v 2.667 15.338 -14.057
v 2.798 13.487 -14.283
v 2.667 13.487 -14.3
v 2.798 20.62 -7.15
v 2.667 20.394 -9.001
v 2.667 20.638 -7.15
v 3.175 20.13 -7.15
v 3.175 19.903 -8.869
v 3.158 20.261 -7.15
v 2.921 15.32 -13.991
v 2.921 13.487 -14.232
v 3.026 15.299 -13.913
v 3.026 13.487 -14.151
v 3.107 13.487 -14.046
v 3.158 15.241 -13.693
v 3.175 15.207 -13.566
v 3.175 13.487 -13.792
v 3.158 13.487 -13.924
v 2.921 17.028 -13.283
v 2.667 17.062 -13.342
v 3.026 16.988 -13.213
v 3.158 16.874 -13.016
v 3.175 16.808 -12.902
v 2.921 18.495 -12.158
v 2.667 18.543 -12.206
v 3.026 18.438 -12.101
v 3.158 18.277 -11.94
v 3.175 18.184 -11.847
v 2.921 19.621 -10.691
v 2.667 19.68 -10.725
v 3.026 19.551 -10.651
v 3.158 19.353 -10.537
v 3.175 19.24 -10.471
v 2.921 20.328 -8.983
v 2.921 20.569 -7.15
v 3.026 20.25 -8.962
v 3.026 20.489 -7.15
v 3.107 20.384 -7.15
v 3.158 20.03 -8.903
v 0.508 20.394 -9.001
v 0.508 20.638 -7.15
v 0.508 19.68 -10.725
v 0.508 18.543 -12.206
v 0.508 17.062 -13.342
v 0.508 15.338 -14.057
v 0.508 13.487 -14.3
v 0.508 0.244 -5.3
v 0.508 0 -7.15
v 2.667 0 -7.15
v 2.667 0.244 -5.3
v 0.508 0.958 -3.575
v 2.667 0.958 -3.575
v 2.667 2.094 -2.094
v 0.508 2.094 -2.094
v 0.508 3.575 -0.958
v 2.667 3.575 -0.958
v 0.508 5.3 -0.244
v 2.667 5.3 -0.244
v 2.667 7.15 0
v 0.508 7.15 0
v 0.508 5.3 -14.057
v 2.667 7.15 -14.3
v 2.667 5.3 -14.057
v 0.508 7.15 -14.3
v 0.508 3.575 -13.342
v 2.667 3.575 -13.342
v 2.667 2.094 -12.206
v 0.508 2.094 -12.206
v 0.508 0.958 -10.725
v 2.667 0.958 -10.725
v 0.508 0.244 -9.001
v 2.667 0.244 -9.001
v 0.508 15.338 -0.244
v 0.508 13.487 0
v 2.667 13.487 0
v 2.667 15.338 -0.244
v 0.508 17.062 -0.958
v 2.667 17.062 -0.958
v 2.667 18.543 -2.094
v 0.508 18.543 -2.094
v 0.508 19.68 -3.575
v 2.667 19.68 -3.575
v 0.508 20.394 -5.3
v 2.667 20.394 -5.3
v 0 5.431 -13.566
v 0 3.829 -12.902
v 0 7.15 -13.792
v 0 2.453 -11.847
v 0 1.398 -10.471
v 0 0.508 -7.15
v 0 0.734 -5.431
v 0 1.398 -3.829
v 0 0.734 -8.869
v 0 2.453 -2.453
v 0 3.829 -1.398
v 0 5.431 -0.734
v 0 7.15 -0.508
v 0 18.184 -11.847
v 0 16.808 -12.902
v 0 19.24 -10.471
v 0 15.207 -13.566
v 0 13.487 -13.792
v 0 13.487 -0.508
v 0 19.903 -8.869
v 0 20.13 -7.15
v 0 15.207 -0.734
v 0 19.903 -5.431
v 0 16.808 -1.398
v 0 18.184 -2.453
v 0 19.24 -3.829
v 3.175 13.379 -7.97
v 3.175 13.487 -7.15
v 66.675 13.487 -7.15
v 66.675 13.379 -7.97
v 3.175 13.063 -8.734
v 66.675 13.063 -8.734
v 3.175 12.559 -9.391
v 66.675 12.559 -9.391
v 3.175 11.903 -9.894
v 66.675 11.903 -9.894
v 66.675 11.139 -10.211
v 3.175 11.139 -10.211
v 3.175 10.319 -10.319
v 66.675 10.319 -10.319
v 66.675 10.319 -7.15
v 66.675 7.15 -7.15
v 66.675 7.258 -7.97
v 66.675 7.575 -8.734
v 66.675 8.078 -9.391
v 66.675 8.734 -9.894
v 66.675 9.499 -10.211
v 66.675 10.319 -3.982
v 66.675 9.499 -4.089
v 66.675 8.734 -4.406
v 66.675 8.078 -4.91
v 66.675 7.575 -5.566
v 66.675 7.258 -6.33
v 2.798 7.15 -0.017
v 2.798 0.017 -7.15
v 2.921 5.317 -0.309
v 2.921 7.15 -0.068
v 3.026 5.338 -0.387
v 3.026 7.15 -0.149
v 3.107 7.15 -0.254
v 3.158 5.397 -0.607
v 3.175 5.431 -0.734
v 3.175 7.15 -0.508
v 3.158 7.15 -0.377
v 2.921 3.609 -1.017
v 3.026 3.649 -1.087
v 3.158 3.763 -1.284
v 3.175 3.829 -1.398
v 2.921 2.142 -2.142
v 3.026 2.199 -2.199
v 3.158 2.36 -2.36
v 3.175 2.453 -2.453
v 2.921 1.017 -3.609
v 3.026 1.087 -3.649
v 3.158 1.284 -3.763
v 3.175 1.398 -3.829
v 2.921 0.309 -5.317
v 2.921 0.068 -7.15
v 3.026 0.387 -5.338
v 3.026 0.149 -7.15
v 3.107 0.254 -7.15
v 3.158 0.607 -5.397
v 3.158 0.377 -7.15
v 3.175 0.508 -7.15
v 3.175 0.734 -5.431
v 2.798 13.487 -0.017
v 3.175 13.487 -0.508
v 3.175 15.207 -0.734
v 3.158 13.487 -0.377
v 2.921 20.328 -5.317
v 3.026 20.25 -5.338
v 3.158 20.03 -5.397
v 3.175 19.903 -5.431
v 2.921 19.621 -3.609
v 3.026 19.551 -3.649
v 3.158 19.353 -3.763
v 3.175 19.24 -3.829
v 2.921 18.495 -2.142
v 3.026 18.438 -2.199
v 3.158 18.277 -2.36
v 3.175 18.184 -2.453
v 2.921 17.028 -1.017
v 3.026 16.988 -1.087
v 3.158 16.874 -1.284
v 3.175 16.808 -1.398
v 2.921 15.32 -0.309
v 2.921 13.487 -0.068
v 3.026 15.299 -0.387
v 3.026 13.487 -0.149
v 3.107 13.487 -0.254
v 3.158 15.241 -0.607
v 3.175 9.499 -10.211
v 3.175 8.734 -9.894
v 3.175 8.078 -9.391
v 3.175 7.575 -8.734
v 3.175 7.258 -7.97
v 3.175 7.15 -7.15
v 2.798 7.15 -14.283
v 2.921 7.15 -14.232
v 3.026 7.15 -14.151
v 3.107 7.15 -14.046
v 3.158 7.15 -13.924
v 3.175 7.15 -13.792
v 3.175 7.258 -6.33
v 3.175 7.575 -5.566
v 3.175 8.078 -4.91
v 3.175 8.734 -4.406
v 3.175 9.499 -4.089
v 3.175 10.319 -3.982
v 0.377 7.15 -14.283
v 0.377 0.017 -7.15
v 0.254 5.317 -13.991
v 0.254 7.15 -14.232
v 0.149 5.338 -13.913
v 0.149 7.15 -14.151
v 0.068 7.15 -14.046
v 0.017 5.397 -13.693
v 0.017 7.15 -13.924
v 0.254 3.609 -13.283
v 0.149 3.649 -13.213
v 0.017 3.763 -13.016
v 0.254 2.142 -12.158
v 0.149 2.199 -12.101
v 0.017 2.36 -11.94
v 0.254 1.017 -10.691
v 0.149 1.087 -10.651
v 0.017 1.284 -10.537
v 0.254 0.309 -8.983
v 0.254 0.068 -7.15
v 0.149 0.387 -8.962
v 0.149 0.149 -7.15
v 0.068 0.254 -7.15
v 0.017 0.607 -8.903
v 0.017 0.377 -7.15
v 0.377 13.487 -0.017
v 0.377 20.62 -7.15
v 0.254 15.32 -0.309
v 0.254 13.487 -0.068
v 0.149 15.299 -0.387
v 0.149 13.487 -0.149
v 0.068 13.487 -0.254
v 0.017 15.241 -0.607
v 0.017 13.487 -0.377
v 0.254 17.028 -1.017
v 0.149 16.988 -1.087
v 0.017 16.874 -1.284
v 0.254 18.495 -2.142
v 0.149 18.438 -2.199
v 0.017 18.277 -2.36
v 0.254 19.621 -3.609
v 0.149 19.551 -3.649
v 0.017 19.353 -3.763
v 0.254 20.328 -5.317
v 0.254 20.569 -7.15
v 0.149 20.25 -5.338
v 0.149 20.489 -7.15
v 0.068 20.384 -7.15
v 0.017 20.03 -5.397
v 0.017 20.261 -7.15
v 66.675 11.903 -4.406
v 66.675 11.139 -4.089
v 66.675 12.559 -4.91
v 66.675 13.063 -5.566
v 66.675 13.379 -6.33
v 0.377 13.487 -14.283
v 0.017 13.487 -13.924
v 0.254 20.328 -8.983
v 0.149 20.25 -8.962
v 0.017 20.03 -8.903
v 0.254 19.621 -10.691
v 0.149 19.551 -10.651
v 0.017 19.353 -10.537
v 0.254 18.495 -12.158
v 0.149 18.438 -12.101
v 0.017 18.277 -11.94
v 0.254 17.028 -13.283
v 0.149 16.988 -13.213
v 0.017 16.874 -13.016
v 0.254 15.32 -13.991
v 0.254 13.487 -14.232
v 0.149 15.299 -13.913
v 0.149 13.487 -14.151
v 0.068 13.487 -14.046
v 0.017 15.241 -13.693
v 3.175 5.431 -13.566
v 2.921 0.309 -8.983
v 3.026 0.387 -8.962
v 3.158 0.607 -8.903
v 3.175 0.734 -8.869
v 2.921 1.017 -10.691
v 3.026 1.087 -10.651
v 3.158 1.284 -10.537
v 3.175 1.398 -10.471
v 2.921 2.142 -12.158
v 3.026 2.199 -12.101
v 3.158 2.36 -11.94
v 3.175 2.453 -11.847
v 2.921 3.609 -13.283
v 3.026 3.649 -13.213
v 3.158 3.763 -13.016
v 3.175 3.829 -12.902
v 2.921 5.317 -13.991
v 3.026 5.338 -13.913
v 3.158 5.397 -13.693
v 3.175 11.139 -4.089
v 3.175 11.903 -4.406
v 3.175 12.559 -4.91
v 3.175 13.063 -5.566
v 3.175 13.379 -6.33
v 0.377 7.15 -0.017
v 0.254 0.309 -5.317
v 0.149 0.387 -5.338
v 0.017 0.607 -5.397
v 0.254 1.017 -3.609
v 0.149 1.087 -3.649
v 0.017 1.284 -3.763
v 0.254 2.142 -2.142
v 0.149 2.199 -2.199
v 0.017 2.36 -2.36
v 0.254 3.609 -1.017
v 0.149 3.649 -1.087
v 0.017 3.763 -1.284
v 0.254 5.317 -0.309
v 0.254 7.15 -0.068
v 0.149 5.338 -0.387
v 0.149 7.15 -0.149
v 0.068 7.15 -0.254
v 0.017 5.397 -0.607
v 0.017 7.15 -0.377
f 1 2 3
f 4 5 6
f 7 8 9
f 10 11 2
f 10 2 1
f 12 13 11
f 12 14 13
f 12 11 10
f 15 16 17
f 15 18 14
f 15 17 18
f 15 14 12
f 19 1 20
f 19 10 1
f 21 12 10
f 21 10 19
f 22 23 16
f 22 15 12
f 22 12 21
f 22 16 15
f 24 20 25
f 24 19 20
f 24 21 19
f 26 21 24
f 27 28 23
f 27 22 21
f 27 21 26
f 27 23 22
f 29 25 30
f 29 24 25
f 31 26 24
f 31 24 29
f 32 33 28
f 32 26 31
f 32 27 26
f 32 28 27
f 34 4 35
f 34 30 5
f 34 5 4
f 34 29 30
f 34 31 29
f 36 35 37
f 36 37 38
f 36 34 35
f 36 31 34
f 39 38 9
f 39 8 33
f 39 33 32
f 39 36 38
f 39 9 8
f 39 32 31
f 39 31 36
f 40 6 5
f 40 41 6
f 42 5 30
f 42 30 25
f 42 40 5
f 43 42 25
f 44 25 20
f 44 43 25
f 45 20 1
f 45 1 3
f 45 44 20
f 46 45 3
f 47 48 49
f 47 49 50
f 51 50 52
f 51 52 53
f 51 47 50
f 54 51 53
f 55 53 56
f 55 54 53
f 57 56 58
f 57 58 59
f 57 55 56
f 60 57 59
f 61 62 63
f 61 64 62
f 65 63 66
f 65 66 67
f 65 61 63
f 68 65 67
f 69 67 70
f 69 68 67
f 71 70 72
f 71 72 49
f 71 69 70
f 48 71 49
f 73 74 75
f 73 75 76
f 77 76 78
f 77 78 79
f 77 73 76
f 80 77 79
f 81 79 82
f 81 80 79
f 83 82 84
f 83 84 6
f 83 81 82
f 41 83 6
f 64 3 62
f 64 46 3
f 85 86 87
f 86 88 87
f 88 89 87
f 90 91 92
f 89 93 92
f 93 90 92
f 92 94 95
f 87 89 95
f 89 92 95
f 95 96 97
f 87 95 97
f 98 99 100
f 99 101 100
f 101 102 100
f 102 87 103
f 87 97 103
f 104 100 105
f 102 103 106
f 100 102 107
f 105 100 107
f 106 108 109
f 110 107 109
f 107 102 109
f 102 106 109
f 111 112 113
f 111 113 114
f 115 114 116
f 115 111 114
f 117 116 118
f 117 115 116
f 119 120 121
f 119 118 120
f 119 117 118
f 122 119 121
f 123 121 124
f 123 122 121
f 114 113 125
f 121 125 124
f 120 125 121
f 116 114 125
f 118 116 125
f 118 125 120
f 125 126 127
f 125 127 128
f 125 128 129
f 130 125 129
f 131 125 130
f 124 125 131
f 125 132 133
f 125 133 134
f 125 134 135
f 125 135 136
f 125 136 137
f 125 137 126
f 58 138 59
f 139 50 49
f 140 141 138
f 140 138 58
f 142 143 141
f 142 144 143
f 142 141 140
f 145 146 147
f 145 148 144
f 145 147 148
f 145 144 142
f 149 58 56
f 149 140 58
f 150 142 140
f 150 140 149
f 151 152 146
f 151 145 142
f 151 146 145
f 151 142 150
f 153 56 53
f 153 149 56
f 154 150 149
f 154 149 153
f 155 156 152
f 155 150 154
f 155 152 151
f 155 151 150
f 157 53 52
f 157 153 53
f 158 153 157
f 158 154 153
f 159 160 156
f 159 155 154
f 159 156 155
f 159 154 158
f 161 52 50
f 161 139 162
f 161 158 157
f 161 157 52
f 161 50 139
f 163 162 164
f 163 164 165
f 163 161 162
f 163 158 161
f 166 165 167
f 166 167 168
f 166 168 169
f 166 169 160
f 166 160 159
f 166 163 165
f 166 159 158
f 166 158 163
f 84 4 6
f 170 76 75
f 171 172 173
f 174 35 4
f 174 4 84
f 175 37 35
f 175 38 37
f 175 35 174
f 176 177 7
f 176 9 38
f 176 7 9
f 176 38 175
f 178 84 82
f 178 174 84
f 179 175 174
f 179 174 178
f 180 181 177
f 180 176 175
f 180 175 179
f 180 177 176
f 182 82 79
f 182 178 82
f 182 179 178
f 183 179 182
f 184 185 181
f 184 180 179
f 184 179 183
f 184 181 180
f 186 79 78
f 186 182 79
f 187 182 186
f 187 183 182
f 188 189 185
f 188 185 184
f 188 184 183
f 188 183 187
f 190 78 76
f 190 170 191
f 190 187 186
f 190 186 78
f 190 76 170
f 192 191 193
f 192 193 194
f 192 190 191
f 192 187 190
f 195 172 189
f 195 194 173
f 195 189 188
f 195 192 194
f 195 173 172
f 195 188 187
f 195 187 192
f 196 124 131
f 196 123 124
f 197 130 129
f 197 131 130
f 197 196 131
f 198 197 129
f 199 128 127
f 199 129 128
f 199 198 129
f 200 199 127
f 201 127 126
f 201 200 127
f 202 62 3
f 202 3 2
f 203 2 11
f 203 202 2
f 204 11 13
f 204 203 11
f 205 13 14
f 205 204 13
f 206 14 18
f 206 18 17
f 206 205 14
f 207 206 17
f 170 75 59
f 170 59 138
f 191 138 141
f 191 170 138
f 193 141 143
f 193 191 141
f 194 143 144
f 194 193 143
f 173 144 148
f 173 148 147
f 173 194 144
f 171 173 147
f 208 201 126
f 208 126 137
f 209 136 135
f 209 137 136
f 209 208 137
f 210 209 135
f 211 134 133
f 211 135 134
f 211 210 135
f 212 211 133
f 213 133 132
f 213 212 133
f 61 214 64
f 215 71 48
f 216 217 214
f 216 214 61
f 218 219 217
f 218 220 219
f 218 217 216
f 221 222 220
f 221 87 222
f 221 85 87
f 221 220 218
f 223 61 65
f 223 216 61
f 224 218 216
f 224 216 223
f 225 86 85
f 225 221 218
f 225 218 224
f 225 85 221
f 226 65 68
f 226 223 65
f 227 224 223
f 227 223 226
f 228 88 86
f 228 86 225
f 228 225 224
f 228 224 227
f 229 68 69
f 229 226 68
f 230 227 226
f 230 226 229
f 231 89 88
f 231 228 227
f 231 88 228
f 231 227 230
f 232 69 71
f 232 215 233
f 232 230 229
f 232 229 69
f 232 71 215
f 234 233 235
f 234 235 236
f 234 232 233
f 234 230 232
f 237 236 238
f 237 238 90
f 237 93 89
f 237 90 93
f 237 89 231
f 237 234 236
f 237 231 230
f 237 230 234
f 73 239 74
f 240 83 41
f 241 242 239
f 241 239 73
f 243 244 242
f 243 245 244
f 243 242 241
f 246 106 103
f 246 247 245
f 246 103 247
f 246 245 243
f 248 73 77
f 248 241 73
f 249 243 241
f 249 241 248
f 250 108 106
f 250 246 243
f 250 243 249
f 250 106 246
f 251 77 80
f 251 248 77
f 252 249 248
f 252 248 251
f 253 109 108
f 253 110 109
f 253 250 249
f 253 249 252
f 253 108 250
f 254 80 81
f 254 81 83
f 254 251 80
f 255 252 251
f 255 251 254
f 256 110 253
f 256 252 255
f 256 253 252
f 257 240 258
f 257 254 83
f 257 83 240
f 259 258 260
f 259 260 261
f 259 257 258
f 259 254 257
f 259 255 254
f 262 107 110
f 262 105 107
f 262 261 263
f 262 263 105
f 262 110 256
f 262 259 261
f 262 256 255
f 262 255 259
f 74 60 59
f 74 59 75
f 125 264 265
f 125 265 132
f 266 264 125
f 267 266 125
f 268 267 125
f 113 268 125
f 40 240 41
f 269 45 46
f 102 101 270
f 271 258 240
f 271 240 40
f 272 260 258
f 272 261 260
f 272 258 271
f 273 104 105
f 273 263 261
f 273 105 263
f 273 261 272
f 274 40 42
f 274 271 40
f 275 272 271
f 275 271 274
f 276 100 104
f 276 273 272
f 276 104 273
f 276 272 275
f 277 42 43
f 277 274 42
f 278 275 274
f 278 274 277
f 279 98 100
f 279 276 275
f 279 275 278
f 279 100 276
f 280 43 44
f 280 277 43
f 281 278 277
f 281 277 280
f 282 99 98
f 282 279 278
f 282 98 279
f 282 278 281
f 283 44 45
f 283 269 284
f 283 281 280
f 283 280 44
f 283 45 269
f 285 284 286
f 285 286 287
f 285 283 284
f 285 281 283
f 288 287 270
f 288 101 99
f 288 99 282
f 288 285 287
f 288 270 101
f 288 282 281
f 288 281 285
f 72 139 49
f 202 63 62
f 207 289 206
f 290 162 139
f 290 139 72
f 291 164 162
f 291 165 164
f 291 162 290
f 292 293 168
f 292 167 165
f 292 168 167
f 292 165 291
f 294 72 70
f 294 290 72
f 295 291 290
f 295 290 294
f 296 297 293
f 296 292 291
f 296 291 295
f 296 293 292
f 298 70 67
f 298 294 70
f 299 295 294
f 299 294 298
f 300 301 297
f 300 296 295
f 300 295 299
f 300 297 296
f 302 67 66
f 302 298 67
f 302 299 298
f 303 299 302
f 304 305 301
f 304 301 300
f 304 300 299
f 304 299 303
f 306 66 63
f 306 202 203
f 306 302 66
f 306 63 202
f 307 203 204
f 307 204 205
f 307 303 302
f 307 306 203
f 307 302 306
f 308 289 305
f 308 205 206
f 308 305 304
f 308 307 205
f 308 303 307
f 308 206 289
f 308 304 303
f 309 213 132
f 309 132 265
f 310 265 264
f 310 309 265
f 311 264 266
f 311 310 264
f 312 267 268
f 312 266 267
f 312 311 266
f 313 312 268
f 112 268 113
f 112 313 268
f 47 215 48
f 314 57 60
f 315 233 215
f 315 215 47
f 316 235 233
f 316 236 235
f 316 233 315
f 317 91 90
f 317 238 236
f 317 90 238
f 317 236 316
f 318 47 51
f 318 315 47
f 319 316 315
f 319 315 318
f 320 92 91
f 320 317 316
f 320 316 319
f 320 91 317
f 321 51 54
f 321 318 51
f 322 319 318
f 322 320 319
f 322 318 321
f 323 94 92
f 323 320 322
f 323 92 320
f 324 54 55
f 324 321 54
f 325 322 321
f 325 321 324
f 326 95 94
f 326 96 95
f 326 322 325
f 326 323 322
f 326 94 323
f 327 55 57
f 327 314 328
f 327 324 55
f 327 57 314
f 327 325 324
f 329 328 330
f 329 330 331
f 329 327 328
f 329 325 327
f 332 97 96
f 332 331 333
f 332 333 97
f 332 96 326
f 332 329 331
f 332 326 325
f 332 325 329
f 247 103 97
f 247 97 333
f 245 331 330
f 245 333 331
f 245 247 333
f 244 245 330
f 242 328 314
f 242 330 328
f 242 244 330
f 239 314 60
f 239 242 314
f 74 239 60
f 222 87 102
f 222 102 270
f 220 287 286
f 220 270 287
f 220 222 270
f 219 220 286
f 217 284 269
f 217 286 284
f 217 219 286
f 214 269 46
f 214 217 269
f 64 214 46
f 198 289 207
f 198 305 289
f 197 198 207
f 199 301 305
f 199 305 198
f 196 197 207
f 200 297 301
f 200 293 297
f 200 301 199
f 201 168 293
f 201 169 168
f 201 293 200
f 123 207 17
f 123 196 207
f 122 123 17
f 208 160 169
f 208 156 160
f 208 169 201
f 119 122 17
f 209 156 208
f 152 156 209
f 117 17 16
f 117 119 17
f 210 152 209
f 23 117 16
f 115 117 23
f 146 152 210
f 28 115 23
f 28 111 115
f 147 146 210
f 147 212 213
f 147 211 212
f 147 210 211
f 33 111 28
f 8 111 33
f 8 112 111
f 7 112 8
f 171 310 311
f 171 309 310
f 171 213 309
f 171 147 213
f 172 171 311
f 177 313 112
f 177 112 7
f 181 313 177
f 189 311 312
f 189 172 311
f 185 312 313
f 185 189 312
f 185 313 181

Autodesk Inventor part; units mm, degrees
ref_plane "YZ Plane" through (0, 0, 0) normal (1, 0, 0) x (0, 1, 0)
ref_plane "XZ Plane" through (0, 0, 0) normal (0, 1, 0) x (-1, 0, 0)
ref_plane "XY Plane" through (0, 0, 0) normal (0, 0, 1) x (1, 0, 0)
sketch "Sketch1" plane through (0, 0, 0) normal (1, 0, 0) x (0, 1, 0)
  line L0 (7.1501, 0) -> (13.4874, 0)
  line L1 (20.6375, -7.1501) -> (20.6375, -7.1501)
  line L2 (13.4874, -14.3002) -> (7.1501, -14.3002)
  line L3 (0, -7.1501) -> (0, -7.1501)
  arc A0 (20.6375, -7.1501) -> (13.4874, 0) centre (13.4874, -7.1501) ccw
  arc A1 (13.4874, -14.3002) -> (20.6375, -7.1501) centre (13.4874, -7.1501) ccw
  arc A2 (0, -7.1501) -> (7.1501, -14.3002) centre (7.1501, -7.1501) ccw
  arc A3 (7.1501, 0) -> (0, -7.1501) centre (7.1501, -7.1501) ccw
  point P0 (0, 0)
  point P1 (20.6375, -14.3002)
  point P2 (20.6375, 0)
  point P3 (0, -14.3002)
  dimension "d0" = 20.6375
  dimension "d1" = 14.3002
  dimension "d2" = 7.1501
extrude "Extrusion1" add sketch "Sketch1" along normal blind 3.175
sketch "Sketch2" plane through (3.175, 0, 0) normal (1, 0, 0) x (0, 0, -1)
  line L0 (0, 13.4874) -> (0, 7.1501) projected
  line L1 (0, 10.3187) -> (14.3002, 10.3187)
  line L2 (14.3002, 7.1501) -> (14.3002, 13.4874) projected
  arc A0 (14.3002, 13.4874) -> (0, 13.4874) centre (7.1501, 13.4874) ccw projected
  arc A1 (0, 7.1501) -> (14.3002, 7.1501) centre (7.1501, 7.1501) ccw projected
  line L3 (7.1501, 13.4874) -> (7.1501, 7.1501)
  circle A2 centre (7.1501, 10.3187) radius 3.1686
  point P0 (0, 0)
extrude "Extrusion2" add sketch "Sketch2" along normal blind 63.5 contours A2 L3 L1 | L1 L3 A2 | L3 A2 L1 | L1 A2 L3
thread "Thread1" size "1/4-20 UNC" class "2A" standard "ANSI Unified Screw Threads" full length
fillet "Fillet1" radius 0.508 8 edges at (3.175, 10.3187, 0) (3.175, 0, -7.1501) (3.175, 10.3187, -14.3002) (3.175, 20.6375, -7.1501) (0, 10.3187, 0) (0, 0, -7.1501) (0, 10.3187, -14.3002) (0, 20.6375, -7.1501)
properties part number "TeeBolt"
